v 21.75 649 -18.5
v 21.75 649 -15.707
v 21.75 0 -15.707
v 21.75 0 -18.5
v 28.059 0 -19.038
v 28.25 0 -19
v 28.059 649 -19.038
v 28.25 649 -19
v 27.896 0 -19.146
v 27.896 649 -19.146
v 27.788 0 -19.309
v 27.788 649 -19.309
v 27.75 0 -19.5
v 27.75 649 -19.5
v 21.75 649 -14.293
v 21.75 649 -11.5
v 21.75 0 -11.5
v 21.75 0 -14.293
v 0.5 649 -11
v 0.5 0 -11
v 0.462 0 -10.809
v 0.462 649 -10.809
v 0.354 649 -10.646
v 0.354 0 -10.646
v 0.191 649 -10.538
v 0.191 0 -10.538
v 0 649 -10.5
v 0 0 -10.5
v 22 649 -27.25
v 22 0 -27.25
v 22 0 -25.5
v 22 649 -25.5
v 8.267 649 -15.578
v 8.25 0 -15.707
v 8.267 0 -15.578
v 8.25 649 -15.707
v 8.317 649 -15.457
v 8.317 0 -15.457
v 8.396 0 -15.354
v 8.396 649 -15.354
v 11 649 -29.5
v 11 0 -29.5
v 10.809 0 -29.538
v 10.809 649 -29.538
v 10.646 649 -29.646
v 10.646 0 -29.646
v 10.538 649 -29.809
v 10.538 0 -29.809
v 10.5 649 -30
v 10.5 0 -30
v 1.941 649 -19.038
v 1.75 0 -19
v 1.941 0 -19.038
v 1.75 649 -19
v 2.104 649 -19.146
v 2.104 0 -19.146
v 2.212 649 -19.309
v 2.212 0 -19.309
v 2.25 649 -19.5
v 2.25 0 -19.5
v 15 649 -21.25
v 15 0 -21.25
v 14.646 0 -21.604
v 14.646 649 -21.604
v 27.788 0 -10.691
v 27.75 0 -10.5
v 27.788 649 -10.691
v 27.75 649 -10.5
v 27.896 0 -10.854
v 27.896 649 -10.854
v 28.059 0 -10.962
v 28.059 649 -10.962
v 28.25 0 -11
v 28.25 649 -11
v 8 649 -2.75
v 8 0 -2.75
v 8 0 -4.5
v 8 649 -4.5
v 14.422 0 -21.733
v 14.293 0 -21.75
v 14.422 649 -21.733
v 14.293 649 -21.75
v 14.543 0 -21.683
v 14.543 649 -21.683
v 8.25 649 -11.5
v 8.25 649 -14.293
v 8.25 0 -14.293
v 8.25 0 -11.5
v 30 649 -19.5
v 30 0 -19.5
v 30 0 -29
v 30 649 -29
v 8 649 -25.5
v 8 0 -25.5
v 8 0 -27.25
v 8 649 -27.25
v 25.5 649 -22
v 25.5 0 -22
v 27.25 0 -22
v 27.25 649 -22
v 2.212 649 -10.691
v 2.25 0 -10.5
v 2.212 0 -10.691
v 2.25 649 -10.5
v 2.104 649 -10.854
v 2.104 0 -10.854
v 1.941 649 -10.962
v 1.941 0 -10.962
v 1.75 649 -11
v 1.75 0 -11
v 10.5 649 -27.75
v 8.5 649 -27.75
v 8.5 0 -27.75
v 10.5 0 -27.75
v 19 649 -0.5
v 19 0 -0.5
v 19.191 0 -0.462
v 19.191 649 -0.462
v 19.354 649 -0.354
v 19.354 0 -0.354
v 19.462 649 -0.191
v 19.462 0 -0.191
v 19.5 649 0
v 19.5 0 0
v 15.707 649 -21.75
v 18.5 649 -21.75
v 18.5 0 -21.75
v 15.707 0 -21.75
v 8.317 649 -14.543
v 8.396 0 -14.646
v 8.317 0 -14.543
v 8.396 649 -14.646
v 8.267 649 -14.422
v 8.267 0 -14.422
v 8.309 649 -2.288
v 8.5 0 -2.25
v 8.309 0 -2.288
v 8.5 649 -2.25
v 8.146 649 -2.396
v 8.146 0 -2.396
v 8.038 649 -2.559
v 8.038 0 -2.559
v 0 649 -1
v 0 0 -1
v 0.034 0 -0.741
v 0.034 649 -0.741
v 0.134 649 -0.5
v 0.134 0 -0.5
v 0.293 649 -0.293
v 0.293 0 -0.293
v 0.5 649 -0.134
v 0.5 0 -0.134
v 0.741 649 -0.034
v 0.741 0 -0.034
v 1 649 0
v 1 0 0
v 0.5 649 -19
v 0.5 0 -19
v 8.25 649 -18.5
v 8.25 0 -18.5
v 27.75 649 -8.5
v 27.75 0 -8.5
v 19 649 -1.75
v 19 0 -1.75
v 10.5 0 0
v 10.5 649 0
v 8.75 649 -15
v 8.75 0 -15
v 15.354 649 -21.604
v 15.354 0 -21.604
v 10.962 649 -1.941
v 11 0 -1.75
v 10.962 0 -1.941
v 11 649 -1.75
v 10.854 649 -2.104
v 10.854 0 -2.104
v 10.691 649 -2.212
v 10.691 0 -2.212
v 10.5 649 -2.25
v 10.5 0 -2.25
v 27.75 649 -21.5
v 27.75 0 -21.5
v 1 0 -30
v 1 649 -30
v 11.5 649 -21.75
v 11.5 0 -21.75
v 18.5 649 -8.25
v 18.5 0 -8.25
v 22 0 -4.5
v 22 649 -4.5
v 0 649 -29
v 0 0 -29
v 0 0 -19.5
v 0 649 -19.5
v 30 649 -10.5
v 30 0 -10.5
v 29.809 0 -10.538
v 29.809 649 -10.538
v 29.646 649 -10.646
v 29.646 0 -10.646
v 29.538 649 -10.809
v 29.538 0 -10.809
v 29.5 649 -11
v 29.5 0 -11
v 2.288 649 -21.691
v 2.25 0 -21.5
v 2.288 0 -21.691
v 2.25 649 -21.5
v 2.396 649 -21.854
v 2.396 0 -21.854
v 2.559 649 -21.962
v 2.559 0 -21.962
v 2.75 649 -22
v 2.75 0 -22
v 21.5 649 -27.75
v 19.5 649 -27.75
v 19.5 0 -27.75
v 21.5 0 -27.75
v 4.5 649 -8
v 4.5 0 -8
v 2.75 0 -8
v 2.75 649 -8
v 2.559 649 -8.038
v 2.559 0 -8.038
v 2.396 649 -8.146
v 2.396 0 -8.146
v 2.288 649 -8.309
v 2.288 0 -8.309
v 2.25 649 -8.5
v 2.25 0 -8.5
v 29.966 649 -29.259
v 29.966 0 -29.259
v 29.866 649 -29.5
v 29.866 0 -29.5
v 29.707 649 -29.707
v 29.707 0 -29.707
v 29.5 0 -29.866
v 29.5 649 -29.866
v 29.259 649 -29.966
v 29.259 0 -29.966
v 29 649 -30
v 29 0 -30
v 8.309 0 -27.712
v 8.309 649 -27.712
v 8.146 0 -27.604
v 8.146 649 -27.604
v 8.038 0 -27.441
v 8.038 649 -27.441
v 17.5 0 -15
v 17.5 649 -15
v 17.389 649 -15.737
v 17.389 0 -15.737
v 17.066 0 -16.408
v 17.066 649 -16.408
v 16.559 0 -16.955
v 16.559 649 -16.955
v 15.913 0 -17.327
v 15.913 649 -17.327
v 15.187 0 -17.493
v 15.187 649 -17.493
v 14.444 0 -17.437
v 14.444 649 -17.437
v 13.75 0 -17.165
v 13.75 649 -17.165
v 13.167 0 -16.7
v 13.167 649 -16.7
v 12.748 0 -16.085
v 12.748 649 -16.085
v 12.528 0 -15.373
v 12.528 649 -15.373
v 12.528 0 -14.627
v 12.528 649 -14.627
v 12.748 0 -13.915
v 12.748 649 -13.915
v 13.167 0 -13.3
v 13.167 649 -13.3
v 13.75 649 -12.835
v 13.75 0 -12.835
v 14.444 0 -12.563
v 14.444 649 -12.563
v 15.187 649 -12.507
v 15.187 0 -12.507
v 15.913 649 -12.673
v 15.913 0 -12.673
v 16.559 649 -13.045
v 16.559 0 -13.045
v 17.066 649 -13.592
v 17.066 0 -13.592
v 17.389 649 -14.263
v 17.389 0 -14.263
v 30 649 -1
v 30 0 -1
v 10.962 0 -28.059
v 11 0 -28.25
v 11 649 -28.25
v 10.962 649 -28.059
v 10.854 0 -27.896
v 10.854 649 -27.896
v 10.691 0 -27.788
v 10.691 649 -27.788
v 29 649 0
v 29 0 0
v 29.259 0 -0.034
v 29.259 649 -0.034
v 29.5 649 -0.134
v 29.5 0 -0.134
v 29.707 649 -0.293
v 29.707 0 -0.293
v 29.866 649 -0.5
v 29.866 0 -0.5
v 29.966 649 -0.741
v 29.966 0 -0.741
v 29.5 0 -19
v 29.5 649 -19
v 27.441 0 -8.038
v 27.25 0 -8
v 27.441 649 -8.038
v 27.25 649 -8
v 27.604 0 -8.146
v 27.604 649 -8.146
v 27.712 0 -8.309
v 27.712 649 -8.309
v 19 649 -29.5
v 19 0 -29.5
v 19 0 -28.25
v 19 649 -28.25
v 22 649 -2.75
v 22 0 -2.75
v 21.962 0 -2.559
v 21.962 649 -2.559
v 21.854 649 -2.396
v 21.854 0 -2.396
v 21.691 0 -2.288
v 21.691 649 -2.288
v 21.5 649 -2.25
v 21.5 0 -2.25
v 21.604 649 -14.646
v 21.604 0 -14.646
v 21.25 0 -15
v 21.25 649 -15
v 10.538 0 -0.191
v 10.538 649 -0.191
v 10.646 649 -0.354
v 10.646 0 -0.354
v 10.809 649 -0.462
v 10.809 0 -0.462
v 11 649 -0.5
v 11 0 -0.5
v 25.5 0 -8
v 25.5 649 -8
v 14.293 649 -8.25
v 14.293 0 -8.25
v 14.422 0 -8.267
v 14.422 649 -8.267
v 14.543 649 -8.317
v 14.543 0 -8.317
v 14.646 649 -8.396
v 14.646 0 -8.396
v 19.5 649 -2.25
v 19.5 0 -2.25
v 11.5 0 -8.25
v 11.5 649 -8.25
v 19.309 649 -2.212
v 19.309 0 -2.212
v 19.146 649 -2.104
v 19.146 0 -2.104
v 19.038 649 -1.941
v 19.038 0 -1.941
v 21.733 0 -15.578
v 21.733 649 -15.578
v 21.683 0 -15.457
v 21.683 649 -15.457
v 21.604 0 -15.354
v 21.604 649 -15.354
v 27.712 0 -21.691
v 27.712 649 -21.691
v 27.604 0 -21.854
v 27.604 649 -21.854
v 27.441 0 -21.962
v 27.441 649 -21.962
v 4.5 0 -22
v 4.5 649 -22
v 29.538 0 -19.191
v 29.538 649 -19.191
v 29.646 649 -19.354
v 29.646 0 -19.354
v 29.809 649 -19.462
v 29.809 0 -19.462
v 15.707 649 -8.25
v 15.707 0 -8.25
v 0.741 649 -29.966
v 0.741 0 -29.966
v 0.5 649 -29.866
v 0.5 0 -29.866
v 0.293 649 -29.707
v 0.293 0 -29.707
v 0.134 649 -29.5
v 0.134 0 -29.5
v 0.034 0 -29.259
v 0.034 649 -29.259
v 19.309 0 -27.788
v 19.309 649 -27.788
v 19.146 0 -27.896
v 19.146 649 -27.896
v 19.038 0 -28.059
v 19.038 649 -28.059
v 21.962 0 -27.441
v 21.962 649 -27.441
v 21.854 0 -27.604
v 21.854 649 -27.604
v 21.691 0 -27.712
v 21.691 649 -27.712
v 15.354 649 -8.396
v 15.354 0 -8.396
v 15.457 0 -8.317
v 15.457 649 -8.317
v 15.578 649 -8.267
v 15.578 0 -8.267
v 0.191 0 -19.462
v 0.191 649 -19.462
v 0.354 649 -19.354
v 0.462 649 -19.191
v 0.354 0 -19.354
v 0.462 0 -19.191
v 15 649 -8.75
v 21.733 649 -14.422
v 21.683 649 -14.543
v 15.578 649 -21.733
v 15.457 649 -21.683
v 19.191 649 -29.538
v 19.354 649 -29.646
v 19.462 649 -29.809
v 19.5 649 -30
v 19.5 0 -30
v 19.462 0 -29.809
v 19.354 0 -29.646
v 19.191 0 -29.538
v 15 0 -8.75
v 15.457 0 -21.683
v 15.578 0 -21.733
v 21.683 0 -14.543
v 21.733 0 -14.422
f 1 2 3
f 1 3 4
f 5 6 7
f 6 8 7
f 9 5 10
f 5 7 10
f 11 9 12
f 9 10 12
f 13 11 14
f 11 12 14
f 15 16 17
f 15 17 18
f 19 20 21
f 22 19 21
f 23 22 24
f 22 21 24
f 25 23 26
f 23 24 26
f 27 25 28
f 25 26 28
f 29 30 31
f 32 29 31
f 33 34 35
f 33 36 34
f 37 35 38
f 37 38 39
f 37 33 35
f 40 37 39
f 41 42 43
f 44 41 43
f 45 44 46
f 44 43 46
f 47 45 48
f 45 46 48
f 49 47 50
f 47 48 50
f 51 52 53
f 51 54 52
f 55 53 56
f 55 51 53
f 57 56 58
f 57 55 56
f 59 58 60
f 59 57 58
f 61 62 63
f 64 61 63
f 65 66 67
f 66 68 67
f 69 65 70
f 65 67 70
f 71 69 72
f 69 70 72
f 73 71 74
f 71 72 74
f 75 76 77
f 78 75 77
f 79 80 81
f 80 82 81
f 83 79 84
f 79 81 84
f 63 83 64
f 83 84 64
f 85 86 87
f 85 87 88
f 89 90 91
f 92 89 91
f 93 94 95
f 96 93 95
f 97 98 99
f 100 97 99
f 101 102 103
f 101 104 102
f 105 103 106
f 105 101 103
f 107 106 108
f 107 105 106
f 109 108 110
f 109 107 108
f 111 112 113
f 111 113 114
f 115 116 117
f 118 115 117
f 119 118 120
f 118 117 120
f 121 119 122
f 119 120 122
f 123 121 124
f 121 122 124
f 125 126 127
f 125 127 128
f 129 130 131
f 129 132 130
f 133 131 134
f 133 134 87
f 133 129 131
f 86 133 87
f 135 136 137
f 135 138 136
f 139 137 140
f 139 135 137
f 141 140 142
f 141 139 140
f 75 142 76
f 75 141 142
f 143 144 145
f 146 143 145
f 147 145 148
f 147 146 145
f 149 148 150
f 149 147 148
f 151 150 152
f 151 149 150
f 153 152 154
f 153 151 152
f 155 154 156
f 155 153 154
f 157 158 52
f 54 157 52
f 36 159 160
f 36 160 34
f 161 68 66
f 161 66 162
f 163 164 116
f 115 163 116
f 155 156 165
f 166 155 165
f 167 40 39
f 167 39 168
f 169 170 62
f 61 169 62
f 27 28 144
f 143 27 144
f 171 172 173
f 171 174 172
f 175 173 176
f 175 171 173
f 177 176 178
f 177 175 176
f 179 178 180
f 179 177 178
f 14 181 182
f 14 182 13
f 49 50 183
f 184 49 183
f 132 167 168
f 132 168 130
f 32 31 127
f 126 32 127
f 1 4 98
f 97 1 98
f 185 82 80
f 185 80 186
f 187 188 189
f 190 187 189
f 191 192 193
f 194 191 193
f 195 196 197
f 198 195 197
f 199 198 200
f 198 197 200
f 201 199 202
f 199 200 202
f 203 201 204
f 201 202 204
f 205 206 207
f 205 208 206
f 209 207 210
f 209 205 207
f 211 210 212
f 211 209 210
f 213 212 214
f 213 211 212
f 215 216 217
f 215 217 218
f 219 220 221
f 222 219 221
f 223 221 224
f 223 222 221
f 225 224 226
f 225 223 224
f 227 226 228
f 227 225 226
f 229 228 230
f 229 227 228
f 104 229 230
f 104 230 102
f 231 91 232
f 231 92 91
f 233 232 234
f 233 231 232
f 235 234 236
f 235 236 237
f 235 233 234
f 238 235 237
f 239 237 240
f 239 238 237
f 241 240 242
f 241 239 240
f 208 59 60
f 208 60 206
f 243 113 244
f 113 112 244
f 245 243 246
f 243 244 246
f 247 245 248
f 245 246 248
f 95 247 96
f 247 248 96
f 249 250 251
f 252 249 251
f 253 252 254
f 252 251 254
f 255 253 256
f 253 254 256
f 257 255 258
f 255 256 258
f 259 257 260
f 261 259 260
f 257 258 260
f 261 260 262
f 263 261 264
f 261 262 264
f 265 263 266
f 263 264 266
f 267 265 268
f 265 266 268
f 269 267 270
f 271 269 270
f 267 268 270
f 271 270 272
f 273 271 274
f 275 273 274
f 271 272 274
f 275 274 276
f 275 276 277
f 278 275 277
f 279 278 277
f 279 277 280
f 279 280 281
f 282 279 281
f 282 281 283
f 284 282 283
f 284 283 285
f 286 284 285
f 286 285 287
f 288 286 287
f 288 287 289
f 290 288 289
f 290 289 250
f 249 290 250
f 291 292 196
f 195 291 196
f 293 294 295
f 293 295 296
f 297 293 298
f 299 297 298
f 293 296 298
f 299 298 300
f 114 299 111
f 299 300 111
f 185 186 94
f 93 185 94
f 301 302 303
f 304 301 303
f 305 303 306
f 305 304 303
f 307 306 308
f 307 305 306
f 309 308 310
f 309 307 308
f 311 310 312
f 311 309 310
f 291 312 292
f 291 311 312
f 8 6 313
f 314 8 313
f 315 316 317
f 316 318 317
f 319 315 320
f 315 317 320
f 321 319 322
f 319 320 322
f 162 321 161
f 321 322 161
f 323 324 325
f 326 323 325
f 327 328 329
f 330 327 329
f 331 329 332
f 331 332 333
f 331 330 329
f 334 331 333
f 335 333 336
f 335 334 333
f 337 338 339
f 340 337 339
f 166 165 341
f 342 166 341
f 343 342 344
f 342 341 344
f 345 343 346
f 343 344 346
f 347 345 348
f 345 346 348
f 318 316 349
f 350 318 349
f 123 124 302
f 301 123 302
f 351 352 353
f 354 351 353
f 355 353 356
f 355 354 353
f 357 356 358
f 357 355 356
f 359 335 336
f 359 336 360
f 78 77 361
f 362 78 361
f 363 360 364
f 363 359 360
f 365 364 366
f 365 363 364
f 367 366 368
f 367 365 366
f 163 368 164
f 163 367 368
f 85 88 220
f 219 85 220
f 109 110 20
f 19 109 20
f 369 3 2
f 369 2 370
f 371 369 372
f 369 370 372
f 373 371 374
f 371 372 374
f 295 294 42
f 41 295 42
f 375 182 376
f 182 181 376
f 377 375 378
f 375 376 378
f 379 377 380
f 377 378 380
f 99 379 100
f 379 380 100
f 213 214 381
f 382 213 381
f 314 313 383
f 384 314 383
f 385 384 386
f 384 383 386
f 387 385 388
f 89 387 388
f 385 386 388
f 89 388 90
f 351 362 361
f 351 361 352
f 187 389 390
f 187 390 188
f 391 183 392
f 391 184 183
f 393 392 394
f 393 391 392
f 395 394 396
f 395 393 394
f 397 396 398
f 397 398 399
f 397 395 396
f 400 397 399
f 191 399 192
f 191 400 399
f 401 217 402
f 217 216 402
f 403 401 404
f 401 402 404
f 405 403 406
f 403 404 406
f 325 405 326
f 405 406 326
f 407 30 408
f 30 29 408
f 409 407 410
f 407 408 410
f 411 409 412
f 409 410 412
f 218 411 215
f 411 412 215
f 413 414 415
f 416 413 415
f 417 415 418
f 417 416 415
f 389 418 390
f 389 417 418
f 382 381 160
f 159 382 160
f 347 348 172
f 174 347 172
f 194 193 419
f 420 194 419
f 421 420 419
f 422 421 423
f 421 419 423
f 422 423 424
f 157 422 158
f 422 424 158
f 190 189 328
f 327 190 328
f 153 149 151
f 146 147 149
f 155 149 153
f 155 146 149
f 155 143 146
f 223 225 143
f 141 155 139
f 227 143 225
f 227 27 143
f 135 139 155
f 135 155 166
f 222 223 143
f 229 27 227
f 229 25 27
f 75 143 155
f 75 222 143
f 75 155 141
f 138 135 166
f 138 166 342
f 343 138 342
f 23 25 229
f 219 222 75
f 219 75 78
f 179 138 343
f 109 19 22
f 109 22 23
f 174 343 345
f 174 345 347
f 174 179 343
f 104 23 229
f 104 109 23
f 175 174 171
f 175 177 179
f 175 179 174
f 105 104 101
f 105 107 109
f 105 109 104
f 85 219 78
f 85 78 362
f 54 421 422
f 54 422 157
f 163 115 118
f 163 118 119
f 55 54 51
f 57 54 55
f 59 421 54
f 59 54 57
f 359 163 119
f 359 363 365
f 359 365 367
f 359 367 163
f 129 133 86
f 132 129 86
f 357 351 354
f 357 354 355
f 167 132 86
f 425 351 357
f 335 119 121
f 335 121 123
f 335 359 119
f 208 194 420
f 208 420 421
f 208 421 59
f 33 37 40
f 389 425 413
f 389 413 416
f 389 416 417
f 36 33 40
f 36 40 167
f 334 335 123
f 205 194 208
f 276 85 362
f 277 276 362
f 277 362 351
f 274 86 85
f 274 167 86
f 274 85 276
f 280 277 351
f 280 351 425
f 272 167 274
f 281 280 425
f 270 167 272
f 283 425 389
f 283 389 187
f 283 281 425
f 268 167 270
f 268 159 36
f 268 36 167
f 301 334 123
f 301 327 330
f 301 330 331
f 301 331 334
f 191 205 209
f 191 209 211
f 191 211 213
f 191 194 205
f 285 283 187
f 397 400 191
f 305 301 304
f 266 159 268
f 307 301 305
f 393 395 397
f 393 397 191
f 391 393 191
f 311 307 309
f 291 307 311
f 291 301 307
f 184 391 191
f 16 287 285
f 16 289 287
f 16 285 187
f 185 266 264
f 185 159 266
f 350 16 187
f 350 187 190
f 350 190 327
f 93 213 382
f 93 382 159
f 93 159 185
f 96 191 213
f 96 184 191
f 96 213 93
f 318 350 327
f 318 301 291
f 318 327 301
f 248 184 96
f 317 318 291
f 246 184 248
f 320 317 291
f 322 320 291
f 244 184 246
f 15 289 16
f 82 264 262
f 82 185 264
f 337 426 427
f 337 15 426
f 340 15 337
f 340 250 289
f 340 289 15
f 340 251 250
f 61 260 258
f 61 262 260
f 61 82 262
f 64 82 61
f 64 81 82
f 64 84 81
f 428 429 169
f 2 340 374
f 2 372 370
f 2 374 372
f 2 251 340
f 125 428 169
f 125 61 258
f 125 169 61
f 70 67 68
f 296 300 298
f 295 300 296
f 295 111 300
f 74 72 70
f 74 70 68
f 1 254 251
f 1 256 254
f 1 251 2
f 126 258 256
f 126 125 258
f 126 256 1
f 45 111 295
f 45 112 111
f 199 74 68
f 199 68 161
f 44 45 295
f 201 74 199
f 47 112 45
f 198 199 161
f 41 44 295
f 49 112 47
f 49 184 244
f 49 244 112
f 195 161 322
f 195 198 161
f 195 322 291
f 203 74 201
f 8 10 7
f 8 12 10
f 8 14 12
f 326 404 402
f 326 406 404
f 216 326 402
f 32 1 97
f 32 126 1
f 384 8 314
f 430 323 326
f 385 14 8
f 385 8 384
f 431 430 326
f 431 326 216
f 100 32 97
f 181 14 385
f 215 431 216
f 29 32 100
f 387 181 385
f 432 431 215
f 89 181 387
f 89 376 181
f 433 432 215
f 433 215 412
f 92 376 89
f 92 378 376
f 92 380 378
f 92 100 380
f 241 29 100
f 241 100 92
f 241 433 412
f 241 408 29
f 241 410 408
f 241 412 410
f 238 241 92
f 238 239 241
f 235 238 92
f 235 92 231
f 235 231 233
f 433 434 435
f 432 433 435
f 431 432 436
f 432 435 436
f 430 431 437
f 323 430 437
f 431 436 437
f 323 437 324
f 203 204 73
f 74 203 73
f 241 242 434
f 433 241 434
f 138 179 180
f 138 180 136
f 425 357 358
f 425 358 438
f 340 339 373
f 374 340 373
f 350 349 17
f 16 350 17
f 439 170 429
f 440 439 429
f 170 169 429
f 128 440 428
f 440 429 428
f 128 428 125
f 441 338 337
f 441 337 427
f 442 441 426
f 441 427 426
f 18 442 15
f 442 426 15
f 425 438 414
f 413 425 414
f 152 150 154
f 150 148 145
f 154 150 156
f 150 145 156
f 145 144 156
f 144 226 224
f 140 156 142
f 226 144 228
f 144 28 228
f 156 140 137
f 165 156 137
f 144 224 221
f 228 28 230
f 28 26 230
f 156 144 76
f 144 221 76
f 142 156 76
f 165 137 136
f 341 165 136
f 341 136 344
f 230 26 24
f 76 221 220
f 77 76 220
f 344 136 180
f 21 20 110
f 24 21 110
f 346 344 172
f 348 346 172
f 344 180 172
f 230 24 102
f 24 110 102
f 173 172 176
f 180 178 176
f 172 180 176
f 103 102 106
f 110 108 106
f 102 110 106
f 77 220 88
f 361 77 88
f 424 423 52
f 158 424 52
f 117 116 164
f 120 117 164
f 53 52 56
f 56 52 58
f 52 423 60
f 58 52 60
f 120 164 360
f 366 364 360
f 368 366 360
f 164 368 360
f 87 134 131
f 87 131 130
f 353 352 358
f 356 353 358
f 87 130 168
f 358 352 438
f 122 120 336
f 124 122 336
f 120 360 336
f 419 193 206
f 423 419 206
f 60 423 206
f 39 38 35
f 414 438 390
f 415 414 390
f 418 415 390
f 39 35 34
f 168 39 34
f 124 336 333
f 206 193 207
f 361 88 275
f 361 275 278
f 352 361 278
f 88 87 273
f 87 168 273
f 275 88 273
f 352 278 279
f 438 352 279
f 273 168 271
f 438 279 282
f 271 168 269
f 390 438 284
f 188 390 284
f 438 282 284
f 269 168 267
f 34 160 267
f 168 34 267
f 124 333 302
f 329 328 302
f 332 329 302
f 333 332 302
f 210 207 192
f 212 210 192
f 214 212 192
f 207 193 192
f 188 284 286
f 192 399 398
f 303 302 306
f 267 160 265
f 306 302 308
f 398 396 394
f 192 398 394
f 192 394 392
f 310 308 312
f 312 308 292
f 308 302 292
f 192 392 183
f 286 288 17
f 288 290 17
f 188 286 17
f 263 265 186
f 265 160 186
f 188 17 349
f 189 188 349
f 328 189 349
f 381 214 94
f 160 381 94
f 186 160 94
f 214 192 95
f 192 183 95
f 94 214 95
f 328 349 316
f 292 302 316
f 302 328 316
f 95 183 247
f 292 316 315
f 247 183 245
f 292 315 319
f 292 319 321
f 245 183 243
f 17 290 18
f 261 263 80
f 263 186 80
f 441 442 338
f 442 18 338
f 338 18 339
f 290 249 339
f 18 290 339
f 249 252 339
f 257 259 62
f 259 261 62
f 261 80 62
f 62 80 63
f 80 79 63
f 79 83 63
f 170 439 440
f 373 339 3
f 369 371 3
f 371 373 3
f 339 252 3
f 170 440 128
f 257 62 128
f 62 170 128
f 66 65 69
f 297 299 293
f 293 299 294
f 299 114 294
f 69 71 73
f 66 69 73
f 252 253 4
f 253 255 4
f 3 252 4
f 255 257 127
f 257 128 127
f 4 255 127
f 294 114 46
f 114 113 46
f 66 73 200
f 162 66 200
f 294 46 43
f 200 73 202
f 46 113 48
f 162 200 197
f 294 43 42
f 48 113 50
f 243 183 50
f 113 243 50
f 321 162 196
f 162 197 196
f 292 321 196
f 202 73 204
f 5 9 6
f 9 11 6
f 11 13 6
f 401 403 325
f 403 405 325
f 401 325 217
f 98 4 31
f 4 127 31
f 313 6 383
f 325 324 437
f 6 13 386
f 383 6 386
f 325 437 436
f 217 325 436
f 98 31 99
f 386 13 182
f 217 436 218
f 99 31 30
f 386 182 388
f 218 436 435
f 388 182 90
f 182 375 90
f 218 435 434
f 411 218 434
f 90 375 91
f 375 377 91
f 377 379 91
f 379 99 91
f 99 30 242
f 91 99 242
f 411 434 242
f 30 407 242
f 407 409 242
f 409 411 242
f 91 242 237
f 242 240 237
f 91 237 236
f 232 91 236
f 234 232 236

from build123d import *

# Parameters (mm, degrees)
BOSS_EXTRUDE1_DEPTH = 649
FILLET1_R           = 1
SKETCH4_R           = 2.5
CUT_EXTRUDE1_DEPTH  = 650
FILLET2_R           = 0.5


with BuildPart() as part:
    # Sketch3 → Boss-Extrude1 (new body)
    with BuildSketch(Plane(origin=(0, 0, 0), x_dir=(1, 0, 0), z_dir=(0, 1, 0))):
        with BuildLine():
            Line((11, 27.75), (11, 29.5))
            ThreePointArc((11, 29.5), (10.646446609, 29.646446609), (10.5, 30))
            Line((10.5, 30), (0, 30))
            Line((0, 30), (0, 19.5))
            ThreePointArc((0, 19.5), (0.353553391, 19.353553391), (0.5, 19))
            Line((0.5, 19), (2.25, 19))
            Line((2.25, 19), (2.25, 22))
            Line((2.25, 22), (4.5, 22))
            Line((4.5, 22), (8.25, 18.5))
            Line((8.25, 18.5), (8.25, 15.5))
            Line((8.25, 15.5), (8.75, 15))
            Line((8.75, 15), (8.25, 14.5))
            Line((8.25, 14.5), (8.25, 11.5))
            Line((8.25, 11.5), (4.5, 8))
            Line((4.5, 8), (2.25, 8))
            Line((2.25, 8), (2.25, 11))
            Line((2.25, 11), (0.5, 11))
            ThreePointArc((0.5, 11), (0.353553391, 10.646446609), (0, 10.5))
            Line((0, 10.5), (0, 0))
            Line((0, 0), (10.5, 0))
            ThreePointArc((10.5, 0), (10.646446609, 0.353553391), (11, 0.5))
            Line((11, 0.5), (11, 2.25))
            Line((11, 2.25), (8, 2.25))
            Line((8, 2.25), (8, 4.5))
            Line((8, 4.5), (11.5, 8.25))
            Line((11.5, 8.25), (14.5, 8.25))
            Line((14.5, 8.25), (15, 8.75))
            Line((15, 8.75), (15.5, 8.25))
            Line((15.5, 8.25), (18.5, 8.25))
            Line((18.5, 8.25), (22, 4.5))
            Line((22, 4.5), (22, 2.25))
            Line((22, 2.25), (19, 2.25))
            Line((19, 2.25), (19, 0.5))
            ThreePointArc((19, 0.5), (19.353553391, 0.353553391), (19.5, 0))
            Line((19.5, 0), (30, 0))
            Line((30, 0), (30, 10.5))
            ThreePointArc((30, 10.5), (29.646446609, 10.646446609), (29.5, 11))
            Line((29.5, 11), (27.75, 11))
            Line((27.75, 11), (27.75, 8))
            Line((27.75, 8), (25.5, 8))
            Line((25.5, 8), (21.75, 11.5))
            Line((21.75, 11.5), (21.75, 14.5))
            Line((21.75, 14.5), (21.25, 15))
            Line((21.25, 15), (21.75, 15.5))
            Line((21.75, 15.5), (21.75, 18.5))
            Line((21.75, 18.5), (25.5, 22))
            Line((25.5, 22), (27.75, 22))
            Line((27.75, 22), (27.75, 19))
            Line((27.75, 19), (29.5, 19))
            ThreePointArc((29.5, 19), (29.646446609, 19.353553391), (30, 19.5))
            Line((30, 19.5), (30, 30))
            Line((30, 30), (19.5, 30))
            ThreePointArc((19.5, 30), (19.353553391, 29.646446609), (19, 29.5))
            Line((19, 29.5), (19, 27.75))
            Line((19, 27.75), (22, 27.75))
            Line((22, 27.75), (22, 25.5))
            Line((22, 25.5), (18.5, 21.75))
            Line((18.5, 21.75), (15.5, 21.75))
            Line((15.5, 21.75), (15, 21.25))
            Line((15, 21.25), (14.5, 21.75))
            Line((14.5, 21.75), (11.5, 21.75))
            Line((11.5, 21.75), (8, 25.5))
            Line((8, 25.5), (8, 27.75))
            Line((8, 27.75), (11, 27.75))
        make_face()
    extrude(amount=BOSS_EXTRUDE1_DEPTH)

    # Fillet1
    fillet1_edges = [part.edges().sort_by_distance(p)[0] for p in [
        (30, 324.5, 0),
        (0, 324.5, 0),
        (0, 324.5, -30),
        (30, 324.5, -30),
    ]]
    fillet(fillet1_edges, radius=FILLET1_R)

    # Sketch4 → Cut-Extrude1 (cut, through all)
    with BuildSketch(Plane(origin=(0, 649, 0), x_dir=(1, 0, 0), z_dir=(0, 1, 0))):
        with Locations((15, 15)):
            Circle(SKETCH4_R)
    extrude(amount=-CUT_EXTRUDE1_DEPTH, mode=Mode.SUBTRACT)

    # Fillet2
    fillet2_edges = [part.edges().sort_by_distance(p)[0] for p in [
        (27.75, 324.5, -19),
        (27.75, 324.5, -22),
        (21.75, 324.5, -15.5),
        (21.75, 324.5, -14.5),
        (27.75, 324.5, -8),
        (27.75, 324.5, -11),
        (19, 324.5, -2.25),
        (22, 324.5, -2.25),
        (15.5, 324.5, -8.25),
        (14.5, 324.5, -8.25),
        (8, 324.5, -2.25),
        (11, 324.5, -2.25),
        (2.25, 324.5, -11),
        (2.25, 324.5, -8),
        (8.25, 324.5, -14.5),
        (8.25, 324.5, -15.5),
        (2.25, 324.5, -22),
        (2.25, 324.5, -19),
        (11, 324.5, -27.75),
        (8, 324.5, -27.75),
        (14.5, 324.5, -21.75),
        (15.5, 324.5, -21.75),
        (22, 324.5, -27.75),
        (19, 324.5, -27.75),
    ]]
    fillet(fillet2_edges, radius=FILLET2_R)


solid = part.part
